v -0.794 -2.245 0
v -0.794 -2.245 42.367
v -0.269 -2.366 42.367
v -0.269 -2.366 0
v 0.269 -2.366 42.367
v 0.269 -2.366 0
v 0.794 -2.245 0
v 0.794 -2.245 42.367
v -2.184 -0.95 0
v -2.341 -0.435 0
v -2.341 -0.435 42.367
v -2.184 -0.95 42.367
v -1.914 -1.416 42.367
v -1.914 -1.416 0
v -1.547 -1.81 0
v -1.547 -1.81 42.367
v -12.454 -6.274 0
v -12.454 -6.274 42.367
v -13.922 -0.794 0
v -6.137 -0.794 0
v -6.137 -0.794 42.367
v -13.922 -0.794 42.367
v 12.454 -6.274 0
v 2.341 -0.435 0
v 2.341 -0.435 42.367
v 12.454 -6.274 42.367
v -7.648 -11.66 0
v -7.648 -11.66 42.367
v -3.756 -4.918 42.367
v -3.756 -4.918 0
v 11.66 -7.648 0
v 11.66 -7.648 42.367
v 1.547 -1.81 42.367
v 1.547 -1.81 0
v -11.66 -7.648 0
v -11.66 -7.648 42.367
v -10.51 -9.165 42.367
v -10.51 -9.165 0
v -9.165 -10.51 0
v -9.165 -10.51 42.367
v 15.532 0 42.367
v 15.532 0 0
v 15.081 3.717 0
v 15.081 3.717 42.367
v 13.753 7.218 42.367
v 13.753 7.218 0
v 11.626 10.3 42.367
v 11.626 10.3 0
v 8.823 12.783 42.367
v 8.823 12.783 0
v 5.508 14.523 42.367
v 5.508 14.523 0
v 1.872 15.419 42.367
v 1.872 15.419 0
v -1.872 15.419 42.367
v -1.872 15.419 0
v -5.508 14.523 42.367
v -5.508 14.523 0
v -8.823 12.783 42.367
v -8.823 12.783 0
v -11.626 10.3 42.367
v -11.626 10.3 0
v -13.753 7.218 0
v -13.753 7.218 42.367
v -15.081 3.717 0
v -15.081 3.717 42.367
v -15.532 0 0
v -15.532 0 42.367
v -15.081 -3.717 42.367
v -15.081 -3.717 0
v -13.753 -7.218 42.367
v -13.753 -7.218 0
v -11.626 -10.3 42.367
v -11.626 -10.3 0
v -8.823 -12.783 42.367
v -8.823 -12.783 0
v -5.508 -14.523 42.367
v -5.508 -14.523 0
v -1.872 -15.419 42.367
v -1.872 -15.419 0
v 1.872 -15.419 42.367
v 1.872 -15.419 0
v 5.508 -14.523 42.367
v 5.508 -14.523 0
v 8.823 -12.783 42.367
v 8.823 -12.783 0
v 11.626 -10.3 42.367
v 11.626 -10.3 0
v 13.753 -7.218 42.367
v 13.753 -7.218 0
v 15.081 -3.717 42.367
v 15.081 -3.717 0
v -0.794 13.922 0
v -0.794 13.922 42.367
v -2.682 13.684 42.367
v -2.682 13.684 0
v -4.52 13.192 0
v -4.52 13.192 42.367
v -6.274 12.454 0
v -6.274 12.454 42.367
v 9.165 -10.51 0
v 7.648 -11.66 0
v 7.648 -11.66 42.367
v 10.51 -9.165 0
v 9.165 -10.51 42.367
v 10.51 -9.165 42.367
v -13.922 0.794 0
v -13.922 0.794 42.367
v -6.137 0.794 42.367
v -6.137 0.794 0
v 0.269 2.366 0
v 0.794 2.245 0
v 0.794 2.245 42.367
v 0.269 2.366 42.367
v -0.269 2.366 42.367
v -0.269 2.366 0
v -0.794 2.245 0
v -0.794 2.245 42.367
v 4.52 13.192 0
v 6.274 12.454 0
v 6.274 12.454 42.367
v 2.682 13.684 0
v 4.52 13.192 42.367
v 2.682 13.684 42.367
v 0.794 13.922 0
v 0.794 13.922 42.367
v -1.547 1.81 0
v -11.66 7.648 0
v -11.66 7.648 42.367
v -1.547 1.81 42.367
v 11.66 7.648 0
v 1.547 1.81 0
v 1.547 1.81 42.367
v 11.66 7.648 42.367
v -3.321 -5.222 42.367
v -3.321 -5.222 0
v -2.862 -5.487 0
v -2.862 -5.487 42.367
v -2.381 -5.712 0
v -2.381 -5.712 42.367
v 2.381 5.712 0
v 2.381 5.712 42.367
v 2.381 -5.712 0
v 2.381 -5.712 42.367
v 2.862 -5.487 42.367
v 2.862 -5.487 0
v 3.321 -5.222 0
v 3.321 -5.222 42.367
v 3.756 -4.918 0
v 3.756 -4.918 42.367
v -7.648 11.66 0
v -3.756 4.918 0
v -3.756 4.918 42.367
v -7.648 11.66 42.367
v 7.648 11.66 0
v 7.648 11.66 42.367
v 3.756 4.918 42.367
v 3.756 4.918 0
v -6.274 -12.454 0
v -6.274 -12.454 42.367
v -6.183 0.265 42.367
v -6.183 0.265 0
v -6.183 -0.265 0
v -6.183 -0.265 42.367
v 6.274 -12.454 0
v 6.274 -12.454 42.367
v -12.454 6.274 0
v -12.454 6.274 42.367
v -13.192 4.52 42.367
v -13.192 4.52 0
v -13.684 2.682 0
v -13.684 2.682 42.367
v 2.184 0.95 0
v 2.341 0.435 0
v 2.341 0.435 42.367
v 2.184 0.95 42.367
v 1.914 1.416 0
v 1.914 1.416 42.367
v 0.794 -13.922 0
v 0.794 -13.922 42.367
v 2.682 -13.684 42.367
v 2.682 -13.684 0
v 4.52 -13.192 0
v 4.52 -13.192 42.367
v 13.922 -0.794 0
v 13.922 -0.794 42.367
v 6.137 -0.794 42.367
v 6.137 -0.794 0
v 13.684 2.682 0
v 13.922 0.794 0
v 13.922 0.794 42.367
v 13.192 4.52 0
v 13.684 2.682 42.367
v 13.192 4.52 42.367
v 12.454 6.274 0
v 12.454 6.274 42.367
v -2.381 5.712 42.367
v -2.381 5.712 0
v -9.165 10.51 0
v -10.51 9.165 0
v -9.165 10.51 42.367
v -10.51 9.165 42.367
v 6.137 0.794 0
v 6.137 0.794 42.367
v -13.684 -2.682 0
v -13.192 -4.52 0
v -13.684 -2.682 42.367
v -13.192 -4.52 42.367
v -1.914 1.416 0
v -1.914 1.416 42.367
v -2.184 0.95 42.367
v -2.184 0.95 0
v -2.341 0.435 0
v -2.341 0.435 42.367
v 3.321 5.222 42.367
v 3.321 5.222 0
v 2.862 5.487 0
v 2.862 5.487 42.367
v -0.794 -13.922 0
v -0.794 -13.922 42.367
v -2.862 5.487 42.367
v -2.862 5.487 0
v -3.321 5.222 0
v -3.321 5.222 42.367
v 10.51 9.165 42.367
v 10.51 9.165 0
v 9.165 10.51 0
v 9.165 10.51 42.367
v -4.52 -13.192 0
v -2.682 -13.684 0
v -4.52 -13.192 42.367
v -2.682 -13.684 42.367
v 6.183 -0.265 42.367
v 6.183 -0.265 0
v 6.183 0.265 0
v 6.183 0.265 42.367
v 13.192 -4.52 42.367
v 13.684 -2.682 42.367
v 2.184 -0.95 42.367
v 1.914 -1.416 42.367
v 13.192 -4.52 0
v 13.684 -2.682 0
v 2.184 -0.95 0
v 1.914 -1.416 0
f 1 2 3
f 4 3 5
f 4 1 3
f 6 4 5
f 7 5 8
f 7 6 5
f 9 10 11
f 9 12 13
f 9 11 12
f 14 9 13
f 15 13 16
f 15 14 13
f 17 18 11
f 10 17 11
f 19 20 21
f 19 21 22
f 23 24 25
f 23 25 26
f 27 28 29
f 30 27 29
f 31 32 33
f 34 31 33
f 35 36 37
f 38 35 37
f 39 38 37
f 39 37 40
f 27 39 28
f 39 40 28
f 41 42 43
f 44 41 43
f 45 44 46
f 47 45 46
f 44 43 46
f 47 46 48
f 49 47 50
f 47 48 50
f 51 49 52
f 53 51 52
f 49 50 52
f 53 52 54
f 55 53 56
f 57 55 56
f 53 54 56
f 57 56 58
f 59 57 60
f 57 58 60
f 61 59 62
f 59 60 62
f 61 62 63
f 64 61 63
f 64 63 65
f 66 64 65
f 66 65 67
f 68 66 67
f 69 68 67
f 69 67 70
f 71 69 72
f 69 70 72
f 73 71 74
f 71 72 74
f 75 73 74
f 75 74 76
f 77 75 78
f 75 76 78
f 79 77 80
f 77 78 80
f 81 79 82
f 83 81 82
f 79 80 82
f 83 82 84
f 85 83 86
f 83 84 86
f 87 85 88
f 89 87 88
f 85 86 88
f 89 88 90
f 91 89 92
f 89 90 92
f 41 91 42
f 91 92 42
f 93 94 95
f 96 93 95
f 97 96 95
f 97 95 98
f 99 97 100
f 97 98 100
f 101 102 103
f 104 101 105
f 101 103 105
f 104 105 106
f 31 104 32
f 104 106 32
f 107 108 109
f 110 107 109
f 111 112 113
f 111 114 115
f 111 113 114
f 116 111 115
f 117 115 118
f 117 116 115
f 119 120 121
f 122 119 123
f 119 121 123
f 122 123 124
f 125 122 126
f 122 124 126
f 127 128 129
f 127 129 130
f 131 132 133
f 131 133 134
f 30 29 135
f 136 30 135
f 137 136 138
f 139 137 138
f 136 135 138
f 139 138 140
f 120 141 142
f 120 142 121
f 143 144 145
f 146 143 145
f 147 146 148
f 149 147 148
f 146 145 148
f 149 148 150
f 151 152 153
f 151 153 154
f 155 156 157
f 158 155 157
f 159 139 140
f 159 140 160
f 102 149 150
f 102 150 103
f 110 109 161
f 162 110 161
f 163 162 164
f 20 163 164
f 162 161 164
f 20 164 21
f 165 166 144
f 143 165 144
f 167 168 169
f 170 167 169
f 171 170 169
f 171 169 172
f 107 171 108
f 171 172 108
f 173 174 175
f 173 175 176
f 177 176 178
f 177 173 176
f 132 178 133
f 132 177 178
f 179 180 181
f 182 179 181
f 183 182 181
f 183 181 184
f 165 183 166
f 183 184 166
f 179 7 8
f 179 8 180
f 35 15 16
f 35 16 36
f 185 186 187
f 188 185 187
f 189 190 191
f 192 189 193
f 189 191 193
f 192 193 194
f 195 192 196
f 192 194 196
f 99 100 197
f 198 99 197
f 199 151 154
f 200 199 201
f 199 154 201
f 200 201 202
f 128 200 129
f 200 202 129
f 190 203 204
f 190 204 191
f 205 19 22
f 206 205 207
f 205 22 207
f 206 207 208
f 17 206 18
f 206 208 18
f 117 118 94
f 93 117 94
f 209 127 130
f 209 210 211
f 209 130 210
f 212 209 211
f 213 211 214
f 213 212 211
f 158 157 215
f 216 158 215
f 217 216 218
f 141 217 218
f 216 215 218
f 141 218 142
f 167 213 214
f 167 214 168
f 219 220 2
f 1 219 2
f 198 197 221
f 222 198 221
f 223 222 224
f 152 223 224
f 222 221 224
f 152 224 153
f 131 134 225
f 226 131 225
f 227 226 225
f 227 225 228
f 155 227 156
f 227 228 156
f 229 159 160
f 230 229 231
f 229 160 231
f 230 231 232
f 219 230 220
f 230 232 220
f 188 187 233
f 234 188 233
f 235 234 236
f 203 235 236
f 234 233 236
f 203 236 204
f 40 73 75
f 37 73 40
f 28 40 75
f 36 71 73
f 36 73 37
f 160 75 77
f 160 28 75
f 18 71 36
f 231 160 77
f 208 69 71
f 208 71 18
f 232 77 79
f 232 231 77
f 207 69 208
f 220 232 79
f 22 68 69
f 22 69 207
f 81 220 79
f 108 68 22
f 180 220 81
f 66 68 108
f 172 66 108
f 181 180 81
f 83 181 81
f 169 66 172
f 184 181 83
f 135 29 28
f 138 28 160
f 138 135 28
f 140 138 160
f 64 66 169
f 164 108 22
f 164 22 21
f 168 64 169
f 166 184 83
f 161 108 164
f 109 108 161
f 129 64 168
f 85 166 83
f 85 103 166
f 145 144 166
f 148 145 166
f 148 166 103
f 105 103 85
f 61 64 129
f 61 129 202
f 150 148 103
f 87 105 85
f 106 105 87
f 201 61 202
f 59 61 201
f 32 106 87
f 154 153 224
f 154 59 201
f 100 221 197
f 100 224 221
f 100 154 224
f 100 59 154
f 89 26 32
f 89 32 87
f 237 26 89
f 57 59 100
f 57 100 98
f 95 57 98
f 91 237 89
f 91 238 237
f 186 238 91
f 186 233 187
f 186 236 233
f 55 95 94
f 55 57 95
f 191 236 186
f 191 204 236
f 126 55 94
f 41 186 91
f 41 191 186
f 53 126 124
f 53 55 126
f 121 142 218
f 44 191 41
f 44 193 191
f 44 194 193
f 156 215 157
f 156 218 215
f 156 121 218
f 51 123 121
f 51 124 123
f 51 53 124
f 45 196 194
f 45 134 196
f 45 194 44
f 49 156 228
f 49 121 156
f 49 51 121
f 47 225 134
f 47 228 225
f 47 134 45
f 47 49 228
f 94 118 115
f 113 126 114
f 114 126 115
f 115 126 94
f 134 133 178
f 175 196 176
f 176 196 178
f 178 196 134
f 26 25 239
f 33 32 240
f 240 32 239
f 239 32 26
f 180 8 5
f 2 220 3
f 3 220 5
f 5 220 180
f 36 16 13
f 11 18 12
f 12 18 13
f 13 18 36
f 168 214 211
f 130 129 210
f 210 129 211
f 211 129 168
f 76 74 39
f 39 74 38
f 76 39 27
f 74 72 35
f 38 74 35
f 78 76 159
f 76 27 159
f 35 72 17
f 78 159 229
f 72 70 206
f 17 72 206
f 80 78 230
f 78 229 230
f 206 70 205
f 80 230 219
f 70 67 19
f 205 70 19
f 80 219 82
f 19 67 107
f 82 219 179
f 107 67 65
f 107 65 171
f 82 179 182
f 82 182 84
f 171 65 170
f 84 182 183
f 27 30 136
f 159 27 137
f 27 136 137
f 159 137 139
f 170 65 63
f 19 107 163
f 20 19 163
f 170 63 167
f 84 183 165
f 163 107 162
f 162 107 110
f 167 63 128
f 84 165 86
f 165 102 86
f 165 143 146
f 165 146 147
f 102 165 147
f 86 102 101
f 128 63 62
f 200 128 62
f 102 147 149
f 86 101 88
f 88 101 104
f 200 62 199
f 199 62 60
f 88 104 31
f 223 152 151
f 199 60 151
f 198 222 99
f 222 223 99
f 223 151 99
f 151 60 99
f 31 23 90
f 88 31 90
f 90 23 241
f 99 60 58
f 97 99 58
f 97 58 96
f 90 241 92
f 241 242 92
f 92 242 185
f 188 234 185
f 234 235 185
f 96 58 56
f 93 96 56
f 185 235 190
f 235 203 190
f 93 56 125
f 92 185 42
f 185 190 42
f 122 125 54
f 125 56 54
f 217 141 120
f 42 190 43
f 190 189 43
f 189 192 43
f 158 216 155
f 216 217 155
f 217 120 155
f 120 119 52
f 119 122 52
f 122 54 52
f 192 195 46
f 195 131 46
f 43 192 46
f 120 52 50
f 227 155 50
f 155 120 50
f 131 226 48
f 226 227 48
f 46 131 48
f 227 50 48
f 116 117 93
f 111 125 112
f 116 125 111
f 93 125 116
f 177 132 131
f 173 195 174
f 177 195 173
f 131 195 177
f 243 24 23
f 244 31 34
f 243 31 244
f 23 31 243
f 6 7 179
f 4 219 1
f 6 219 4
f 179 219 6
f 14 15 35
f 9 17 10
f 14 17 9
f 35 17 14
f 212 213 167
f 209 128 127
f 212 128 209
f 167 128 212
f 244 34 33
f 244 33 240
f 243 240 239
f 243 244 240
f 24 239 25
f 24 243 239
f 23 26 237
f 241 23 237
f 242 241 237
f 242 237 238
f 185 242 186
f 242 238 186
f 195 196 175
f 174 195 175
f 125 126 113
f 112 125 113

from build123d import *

# Parameters (mm, degrees)
F0_R     = 15.5321
F0_R_2   = 2.38125
F1_DEPTH = 42.3672
F3_DEPTH = 42.3672
F4_COUNT = 6
F4_ANGLE = 300


with BuildPart() as f1:
    # F0 (on Top) → F1 (new body)
    with BuildSketch(Plane.XY):
        Circle(F0_R)
        Circle(F0_R_2, mode=Mode.SUBTRACT)
    extrude(amount=F1_DEPTH)

    # F2 (on face) → F3 (cut, through all)
    with BuildSketch(Plane.XY.offset(42.3672)):
        with BuildLine():
            ThreePointArc((-1.5474074833, 1.8099396794), (-1.190625, 2.0622229928), (-0.79375, 2.2450640303))
            Line((-0.79375, 2.2450640303), (-0.79375, 13.9219908812))
            ThreePointArc((-0.79375, 13.9219908812), (-3.6091280563, 13.4694492773), (-6.2735877764, 12.4536727744))
            Line((-6.2735877764, 12.4536727744), (-2.38125, 5.7119459855))
            ThreePointArc((-2.38125, 5.7119459855), (-3.0942155106, 5.3593384739), (-3.7560653285, 4.9181959855))
            Line((-3.7560653285, 4.9181959855), (-7.6484031049, 11.6599227744))
            ThreePointArc((-7.6484031049, 11.6599227744), (-9.8603212209, 9.8603212209), (-11.6599227744, 7.6484031049))
            Line((-11.6599227744, 7.6484031049), (-1.5474074833, 1.8099396794))
        make_face()
    f3 = extrude(amount=-F3_DEPTH, mode=Mode.SUBTRACT)

    # F4: F3 ×6 about axis
    f4_axis = Axis((0, 0, 0), (0, 0, 1))
    for i in range(1, F4_COUNT):
        add(f3.rotate(f4_axis, i * F4_ANGLE / (F4_COUNT - 1)), mode=Mode.SUBTRACT)


solid = f1.part
